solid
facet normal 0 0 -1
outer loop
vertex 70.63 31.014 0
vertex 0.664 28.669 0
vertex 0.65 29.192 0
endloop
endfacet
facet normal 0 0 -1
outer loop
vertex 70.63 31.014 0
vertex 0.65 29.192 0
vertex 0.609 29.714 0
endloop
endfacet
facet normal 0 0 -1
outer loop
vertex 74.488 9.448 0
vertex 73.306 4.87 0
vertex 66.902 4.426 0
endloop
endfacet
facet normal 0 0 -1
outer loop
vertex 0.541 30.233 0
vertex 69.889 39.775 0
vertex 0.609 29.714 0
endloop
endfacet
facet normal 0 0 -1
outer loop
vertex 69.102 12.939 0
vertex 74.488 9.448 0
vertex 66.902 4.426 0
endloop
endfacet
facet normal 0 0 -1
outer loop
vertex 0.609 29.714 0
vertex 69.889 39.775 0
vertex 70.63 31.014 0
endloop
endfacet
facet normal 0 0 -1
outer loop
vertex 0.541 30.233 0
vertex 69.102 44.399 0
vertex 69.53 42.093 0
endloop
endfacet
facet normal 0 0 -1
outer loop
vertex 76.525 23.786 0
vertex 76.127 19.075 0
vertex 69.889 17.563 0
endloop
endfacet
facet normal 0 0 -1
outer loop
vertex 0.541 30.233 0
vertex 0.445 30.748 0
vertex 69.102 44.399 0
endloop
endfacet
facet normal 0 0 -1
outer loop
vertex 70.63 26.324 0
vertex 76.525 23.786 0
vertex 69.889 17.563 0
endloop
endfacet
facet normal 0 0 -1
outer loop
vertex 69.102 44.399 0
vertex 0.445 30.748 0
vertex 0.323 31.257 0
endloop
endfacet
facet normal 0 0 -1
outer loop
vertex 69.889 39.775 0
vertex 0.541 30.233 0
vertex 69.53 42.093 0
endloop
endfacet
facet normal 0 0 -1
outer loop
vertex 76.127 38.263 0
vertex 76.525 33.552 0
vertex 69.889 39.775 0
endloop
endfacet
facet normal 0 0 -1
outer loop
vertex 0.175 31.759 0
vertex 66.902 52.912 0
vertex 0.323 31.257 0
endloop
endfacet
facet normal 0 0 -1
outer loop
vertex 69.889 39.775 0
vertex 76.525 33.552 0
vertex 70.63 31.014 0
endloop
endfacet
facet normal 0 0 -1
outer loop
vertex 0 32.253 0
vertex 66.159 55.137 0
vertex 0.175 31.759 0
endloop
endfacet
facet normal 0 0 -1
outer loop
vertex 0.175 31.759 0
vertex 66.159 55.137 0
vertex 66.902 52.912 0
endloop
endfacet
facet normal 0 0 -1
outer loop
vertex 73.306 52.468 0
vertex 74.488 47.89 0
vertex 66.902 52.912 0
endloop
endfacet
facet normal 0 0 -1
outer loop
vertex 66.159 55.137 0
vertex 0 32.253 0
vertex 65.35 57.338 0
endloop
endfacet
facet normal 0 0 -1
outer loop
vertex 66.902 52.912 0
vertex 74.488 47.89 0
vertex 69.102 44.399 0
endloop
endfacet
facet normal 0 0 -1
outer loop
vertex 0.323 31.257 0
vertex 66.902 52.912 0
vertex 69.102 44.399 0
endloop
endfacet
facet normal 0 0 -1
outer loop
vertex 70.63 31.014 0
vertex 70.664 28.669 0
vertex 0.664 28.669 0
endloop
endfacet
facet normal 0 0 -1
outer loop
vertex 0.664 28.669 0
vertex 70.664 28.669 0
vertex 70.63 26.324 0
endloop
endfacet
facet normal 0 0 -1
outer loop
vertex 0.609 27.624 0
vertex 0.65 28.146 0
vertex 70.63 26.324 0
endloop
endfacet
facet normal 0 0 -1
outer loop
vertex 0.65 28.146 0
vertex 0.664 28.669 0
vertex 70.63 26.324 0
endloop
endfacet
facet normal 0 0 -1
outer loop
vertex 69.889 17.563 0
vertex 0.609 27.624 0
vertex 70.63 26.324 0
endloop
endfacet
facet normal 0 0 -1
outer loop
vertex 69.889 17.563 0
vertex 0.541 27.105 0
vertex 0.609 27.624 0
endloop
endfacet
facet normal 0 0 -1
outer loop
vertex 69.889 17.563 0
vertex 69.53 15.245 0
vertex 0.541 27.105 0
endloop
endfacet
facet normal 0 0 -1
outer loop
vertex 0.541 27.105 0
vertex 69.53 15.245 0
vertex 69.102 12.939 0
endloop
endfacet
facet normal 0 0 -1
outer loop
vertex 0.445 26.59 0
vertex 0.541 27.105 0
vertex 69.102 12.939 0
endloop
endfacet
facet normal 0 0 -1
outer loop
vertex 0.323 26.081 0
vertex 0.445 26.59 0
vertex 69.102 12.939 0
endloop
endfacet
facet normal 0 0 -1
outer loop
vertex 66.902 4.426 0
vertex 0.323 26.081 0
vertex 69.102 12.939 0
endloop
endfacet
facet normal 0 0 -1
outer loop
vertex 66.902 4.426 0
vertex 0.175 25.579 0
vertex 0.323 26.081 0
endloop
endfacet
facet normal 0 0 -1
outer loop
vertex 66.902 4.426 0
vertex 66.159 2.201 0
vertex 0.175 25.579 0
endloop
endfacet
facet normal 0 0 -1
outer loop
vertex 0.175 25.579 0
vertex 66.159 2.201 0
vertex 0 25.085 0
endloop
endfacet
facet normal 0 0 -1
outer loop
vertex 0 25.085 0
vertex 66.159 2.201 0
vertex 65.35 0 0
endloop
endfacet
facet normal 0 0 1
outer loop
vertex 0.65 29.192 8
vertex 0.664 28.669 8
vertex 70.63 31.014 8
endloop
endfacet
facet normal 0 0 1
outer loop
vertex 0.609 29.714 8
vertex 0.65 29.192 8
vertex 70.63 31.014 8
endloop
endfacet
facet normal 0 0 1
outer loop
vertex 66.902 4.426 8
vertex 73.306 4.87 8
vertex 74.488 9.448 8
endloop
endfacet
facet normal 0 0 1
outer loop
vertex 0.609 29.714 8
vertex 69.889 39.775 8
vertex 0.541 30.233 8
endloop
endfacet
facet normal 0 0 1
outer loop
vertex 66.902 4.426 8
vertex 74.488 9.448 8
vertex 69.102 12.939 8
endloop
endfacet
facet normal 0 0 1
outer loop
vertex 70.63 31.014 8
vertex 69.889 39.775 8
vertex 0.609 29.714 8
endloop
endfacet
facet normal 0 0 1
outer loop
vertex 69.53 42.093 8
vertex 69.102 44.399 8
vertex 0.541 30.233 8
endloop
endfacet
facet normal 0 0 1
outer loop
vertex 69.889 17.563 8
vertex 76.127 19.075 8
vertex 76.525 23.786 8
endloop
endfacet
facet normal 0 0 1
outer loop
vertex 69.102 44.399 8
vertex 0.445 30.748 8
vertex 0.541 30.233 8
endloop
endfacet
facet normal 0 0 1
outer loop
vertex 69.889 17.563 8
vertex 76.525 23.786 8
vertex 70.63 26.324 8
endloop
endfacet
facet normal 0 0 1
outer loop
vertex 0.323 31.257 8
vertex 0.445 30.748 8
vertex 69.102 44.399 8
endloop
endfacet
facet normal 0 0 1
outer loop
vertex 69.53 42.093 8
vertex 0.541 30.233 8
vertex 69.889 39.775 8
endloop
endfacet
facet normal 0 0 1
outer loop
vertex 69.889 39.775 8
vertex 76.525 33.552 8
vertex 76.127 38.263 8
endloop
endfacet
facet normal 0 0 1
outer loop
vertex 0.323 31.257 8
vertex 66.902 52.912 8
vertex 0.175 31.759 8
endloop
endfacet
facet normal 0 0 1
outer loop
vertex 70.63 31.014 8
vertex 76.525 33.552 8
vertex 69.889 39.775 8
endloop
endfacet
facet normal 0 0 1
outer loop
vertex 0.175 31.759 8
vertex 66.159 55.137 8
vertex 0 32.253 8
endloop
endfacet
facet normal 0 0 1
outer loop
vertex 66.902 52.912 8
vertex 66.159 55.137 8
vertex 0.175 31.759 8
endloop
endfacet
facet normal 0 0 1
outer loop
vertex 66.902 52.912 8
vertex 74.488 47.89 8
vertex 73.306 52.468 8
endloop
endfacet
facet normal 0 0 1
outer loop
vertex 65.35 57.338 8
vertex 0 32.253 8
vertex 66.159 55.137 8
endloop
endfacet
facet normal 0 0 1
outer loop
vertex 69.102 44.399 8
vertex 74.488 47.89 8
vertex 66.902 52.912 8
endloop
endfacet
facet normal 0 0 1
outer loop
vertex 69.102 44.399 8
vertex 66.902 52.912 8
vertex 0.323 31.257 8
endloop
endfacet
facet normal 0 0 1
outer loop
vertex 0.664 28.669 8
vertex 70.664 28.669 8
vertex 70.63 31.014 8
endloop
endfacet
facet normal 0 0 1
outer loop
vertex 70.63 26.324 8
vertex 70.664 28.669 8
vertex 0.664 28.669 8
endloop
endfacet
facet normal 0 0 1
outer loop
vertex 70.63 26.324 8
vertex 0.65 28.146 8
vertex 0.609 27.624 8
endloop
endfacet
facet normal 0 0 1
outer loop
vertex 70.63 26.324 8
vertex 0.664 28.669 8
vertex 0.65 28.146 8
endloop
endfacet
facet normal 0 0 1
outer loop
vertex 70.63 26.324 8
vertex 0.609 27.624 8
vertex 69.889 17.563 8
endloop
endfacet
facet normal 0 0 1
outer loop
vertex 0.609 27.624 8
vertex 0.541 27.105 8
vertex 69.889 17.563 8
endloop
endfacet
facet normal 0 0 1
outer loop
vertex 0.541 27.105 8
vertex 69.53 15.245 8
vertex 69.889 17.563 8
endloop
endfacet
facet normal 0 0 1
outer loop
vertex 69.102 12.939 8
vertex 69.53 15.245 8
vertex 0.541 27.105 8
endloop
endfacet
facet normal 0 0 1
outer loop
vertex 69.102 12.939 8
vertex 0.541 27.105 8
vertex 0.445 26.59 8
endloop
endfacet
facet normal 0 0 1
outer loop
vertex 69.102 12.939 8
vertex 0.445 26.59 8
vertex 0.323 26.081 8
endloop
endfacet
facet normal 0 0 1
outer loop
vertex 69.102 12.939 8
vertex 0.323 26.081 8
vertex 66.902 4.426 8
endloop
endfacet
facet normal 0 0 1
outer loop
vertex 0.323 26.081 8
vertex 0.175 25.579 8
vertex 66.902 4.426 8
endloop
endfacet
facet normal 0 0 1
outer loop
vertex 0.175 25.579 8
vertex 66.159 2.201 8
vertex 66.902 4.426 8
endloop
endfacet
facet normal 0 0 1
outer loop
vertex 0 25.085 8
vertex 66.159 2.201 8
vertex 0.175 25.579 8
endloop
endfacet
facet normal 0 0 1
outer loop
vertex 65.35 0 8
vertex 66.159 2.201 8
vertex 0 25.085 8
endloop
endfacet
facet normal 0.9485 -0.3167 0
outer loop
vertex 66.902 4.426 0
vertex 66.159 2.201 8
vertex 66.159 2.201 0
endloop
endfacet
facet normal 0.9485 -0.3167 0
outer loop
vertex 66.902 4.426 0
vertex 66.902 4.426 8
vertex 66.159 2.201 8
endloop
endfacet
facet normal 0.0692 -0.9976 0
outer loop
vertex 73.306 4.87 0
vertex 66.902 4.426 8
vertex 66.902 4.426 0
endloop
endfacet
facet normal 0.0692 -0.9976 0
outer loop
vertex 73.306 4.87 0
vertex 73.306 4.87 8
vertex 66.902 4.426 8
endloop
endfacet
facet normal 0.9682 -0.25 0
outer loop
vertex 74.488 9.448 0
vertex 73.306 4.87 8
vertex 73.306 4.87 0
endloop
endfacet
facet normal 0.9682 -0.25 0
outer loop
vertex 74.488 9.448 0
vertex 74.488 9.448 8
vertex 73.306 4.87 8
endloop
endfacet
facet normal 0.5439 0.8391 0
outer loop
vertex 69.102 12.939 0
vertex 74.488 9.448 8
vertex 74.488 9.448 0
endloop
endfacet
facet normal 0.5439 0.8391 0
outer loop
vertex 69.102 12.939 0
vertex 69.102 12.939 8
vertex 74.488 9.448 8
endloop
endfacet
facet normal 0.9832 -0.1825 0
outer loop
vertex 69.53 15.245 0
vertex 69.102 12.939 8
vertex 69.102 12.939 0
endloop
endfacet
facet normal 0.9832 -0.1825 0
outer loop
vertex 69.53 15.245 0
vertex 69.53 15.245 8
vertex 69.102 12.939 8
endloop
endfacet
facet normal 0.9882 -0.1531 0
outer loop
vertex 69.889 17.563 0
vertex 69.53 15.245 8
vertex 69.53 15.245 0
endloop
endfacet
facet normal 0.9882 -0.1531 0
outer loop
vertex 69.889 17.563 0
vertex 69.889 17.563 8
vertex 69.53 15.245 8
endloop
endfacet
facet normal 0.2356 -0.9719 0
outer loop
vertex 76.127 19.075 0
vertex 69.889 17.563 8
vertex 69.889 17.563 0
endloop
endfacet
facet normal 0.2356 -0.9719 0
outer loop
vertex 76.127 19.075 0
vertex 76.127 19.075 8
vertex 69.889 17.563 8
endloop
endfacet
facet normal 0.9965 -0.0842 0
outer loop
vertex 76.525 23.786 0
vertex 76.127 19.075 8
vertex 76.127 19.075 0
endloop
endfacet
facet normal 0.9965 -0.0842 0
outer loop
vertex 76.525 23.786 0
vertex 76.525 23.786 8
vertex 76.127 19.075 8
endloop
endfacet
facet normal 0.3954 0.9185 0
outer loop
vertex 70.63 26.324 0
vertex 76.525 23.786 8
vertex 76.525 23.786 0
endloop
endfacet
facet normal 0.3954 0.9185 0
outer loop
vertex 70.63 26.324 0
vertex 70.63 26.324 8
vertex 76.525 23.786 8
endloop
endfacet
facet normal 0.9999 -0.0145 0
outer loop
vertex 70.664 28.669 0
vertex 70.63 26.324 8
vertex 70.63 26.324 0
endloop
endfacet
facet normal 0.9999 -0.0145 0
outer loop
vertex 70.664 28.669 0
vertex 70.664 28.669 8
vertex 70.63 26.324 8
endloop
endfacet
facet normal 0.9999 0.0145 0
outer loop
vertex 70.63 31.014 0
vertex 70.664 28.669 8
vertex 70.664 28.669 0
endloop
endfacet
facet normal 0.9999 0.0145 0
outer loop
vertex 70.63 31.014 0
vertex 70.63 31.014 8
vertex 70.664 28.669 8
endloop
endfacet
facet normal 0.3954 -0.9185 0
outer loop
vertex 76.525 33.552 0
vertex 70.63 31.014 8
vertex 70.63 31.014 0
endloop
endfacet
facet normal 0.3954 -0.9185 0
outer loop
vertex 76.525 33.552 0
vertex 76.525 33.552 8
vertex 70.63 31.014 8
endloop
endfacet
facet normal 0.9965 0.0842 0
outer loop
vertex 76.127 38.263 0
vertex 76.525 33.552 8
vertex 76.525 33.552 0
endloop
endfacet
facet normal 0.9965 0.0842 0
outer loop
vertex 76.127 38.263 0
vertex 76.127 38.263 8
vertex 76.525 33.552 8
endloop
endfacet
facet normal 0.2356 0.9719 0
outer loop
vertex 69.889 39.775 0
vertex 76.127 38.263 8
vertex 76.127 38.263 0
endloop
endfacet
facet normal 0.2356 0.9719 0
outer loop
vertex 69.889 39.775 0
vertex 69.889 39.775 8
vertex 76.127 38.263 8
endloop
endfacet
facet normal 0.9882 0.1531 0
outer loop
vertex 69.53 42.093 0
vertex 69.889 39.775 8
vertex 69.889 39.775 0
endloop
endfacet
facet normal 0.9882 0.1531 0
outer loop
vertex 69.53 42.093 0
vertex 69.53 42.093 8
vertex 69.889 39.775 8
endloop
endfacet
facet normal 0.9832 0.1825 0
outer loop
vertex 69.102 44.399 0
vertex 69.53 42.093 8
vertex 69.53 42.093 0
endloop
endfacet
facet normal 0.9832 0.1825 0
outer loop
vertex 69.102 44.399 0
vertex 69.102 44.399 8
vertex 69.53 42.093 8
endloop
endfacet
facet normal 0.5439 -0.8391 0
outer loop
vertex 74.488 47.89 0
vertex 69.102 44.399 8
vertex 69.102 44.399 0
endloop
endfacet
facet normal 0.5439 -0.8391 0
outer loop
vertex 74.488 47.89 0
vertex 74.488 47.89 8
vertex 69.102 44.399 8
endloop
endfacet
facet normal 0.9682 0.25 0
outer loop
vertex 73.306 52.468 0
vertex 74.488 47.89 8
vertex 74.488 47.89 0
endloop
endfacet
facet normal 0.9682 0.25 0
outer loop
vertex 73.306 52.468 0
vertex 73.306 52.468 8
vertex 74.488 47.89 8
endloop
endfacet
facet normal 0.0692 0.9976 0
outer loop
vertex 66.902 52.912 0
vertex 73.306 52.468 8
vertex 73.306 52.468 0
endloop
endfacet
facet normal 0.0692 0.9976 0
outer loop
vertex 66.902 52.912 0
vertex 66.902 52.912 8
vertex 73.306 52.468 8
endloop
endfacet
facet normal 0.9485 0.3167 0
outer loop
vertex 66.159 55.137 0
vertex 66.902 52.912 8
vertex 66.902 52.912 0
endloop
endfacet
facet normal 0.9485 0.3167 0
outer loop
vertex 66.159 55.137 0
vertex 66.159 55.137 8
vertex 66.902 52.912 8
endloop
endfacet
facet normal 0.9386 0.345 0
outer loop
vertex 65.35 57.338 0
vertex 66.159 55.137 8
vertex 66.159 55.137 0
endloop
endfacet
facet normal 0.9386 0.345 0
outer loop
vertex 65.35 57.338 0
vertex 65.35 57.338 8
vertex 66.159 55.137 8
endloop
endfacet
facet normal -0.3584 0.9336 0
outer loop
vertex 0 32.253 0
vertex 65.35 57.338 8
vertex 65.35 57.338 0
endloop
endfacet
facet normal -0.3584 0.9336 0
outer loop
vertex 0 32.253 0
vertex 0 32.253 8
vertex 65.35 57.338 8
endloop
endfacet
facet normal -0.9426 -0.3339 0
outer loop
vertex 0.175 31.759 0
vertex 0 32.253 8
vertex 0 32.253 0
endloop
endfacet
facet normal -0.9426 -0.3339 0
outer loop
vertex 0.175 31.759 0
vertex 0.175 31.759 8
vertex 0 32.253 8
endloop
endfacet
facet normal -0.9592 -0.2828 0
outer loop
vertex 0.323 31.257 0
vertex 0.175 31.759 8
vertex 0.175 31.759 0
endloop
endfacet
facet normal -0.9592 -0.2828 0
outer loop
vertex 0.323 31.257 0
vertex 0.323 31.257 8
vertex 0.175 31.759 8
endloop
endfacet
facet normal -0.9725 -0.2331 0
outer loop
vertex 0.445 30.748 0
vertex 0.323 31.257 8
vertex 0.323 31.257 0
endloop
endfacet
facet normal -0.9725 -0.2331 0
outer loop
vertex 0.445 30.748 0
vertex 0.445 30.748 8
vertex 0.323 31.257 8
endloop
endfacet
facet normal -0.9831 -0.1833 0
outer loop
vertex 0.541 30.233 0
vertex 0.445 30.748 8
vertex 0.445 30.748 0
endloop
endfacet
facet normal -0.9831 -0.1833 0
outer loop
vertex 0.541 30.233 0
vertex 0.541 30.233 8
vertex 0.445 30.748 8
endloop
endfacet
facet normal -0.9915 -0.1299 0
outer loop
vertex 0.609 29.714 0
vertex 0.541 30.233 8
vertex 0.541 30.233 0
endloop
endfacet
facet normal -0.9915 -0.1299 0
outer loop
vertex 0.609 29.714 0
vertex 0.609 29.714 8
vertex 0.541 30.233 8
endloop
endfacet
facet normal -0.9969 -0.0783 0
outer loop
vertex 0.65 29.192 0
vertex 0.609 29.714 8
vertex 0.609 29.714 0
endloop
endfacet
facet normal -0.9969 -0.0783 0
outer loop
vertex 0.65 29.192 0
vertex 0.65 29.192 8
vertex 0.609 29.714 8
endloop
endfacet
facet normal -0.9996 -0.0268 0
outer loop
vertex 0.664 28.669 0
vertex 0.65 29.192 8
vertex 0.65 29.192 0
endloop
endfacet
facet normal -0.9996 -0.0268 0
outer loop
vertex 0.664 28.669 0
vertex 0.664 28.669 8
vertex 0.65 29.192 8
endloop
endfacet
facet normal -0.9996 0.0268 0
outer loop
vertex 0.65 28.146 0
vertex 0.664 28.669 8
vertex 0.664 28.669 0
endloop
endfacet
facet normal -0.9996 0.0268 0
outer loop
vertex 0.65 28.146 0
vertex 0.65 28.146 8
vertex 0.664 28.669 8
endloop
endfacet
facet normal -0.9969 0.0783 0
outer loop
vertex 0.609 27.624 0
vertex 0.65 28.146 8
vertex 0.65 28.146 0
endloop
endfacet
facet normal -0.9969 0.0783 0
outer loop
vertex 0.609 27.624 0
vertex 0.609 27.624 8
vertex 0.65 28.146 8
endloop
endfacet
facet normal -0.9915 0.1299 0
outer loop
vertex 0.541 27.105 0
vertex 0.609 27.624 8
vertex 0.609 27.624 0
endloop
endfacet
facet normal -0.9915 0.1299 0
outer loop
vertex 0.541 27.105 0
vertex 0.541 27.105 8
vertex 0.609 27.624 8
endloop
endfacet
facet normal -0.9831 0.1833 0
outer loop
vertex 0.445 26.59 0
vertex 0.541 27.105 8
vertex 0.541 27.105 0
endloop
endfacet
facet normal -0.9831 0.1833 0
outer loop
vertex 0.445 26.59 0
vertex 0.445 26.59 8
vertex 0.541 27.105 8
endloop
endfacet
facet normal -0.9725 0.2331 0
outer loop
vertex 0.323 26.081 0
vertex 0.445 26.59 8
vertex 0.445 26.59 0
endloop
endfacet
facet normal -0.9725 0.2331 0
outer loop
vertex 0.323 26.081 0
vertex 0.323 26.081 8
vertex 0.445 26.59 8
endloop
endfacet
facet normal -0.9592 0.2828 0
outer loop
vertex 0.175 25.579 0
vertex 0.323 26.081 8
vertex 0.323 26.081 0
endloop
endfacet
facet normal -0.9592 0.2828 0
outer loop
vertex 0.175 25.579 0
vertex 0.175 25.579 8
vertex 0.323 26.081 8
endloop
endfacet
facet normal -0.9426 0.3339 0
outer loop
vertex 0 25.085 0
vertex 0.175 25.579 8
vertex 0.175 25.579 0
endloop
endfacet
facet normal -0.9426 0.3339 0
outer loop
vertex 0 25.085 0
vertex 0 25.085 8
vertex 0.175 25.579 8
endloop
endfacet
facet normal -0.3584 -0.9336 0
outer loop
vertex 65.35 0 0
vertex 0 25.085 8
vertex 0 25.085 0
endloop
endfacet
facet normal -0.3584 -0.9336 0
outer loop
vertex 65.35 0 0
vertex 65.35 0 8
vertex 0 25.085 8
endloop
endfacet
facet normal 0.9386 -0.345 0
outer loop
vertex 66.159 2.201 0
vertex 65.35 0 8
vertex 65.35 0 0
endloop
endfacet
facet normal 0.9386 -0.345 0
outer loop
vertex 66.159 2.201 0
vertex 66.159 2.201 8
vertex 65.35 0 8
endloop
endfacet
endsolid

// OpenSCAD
$fn = 32;

// ----------------------------------------------------------------------
// Gear sector: 4 teeth on 42 degrees
// ----------------------------------------------------------------------

// --- parameters (mm) ---
sector_angle = 42;        // sector angle, degrees
root_r = 80;              // root circle radius
tooth_h = 6;              // tooth height over the root circle
teeth = 4;                // number of teeth on the sector
hub_r = 10;               // hub bore radius
plate_t = 8;              // sector thickness, Z
arc_step = 3;             // sampling step of the root/hub arcs, degrees

tip_r = root_r + tooth_h;  // tip circle radius

profile = [[65.35, 0], [66.159, 2.201], [66.902, 4.426], [73.306, 4.87], [74.488, 9.448], [69.102, 12.939], [69.53, 15.245], [69.889, 17.563], [76.127, 19.075], [76.525, 23.786], [70.63, 26.324], [70.664, 28.669], [70.63, 31.014], [76.525, 33.552], [76.127, 38.263], [69.889, 39.775], [69.53, 42.093], [69.102, 44.399], [74.488, 47.89], [73.306, 52.468], [66.902, 52.912], [66.159, 55.137], [65.35, 57.338], [0, 32.253], [0.175, 31.759], [0.323, 31.257], [0.445, 30.748], [0.541, 30.233], [0.609, 29.714], [0.65, 29.192], [0.664, 28.669], [0.65, 28.146], [0.609, 27.624], [0.541, 27.105], [0.445, 26.59], [0.323, 26.081], [0.175, 25.579], [0, 25.085]];  // primary outline, 38 points, counter clockwise

// --- the one profile operation ---
linear_extrude(height = plate_t) polygon(points = profile);
